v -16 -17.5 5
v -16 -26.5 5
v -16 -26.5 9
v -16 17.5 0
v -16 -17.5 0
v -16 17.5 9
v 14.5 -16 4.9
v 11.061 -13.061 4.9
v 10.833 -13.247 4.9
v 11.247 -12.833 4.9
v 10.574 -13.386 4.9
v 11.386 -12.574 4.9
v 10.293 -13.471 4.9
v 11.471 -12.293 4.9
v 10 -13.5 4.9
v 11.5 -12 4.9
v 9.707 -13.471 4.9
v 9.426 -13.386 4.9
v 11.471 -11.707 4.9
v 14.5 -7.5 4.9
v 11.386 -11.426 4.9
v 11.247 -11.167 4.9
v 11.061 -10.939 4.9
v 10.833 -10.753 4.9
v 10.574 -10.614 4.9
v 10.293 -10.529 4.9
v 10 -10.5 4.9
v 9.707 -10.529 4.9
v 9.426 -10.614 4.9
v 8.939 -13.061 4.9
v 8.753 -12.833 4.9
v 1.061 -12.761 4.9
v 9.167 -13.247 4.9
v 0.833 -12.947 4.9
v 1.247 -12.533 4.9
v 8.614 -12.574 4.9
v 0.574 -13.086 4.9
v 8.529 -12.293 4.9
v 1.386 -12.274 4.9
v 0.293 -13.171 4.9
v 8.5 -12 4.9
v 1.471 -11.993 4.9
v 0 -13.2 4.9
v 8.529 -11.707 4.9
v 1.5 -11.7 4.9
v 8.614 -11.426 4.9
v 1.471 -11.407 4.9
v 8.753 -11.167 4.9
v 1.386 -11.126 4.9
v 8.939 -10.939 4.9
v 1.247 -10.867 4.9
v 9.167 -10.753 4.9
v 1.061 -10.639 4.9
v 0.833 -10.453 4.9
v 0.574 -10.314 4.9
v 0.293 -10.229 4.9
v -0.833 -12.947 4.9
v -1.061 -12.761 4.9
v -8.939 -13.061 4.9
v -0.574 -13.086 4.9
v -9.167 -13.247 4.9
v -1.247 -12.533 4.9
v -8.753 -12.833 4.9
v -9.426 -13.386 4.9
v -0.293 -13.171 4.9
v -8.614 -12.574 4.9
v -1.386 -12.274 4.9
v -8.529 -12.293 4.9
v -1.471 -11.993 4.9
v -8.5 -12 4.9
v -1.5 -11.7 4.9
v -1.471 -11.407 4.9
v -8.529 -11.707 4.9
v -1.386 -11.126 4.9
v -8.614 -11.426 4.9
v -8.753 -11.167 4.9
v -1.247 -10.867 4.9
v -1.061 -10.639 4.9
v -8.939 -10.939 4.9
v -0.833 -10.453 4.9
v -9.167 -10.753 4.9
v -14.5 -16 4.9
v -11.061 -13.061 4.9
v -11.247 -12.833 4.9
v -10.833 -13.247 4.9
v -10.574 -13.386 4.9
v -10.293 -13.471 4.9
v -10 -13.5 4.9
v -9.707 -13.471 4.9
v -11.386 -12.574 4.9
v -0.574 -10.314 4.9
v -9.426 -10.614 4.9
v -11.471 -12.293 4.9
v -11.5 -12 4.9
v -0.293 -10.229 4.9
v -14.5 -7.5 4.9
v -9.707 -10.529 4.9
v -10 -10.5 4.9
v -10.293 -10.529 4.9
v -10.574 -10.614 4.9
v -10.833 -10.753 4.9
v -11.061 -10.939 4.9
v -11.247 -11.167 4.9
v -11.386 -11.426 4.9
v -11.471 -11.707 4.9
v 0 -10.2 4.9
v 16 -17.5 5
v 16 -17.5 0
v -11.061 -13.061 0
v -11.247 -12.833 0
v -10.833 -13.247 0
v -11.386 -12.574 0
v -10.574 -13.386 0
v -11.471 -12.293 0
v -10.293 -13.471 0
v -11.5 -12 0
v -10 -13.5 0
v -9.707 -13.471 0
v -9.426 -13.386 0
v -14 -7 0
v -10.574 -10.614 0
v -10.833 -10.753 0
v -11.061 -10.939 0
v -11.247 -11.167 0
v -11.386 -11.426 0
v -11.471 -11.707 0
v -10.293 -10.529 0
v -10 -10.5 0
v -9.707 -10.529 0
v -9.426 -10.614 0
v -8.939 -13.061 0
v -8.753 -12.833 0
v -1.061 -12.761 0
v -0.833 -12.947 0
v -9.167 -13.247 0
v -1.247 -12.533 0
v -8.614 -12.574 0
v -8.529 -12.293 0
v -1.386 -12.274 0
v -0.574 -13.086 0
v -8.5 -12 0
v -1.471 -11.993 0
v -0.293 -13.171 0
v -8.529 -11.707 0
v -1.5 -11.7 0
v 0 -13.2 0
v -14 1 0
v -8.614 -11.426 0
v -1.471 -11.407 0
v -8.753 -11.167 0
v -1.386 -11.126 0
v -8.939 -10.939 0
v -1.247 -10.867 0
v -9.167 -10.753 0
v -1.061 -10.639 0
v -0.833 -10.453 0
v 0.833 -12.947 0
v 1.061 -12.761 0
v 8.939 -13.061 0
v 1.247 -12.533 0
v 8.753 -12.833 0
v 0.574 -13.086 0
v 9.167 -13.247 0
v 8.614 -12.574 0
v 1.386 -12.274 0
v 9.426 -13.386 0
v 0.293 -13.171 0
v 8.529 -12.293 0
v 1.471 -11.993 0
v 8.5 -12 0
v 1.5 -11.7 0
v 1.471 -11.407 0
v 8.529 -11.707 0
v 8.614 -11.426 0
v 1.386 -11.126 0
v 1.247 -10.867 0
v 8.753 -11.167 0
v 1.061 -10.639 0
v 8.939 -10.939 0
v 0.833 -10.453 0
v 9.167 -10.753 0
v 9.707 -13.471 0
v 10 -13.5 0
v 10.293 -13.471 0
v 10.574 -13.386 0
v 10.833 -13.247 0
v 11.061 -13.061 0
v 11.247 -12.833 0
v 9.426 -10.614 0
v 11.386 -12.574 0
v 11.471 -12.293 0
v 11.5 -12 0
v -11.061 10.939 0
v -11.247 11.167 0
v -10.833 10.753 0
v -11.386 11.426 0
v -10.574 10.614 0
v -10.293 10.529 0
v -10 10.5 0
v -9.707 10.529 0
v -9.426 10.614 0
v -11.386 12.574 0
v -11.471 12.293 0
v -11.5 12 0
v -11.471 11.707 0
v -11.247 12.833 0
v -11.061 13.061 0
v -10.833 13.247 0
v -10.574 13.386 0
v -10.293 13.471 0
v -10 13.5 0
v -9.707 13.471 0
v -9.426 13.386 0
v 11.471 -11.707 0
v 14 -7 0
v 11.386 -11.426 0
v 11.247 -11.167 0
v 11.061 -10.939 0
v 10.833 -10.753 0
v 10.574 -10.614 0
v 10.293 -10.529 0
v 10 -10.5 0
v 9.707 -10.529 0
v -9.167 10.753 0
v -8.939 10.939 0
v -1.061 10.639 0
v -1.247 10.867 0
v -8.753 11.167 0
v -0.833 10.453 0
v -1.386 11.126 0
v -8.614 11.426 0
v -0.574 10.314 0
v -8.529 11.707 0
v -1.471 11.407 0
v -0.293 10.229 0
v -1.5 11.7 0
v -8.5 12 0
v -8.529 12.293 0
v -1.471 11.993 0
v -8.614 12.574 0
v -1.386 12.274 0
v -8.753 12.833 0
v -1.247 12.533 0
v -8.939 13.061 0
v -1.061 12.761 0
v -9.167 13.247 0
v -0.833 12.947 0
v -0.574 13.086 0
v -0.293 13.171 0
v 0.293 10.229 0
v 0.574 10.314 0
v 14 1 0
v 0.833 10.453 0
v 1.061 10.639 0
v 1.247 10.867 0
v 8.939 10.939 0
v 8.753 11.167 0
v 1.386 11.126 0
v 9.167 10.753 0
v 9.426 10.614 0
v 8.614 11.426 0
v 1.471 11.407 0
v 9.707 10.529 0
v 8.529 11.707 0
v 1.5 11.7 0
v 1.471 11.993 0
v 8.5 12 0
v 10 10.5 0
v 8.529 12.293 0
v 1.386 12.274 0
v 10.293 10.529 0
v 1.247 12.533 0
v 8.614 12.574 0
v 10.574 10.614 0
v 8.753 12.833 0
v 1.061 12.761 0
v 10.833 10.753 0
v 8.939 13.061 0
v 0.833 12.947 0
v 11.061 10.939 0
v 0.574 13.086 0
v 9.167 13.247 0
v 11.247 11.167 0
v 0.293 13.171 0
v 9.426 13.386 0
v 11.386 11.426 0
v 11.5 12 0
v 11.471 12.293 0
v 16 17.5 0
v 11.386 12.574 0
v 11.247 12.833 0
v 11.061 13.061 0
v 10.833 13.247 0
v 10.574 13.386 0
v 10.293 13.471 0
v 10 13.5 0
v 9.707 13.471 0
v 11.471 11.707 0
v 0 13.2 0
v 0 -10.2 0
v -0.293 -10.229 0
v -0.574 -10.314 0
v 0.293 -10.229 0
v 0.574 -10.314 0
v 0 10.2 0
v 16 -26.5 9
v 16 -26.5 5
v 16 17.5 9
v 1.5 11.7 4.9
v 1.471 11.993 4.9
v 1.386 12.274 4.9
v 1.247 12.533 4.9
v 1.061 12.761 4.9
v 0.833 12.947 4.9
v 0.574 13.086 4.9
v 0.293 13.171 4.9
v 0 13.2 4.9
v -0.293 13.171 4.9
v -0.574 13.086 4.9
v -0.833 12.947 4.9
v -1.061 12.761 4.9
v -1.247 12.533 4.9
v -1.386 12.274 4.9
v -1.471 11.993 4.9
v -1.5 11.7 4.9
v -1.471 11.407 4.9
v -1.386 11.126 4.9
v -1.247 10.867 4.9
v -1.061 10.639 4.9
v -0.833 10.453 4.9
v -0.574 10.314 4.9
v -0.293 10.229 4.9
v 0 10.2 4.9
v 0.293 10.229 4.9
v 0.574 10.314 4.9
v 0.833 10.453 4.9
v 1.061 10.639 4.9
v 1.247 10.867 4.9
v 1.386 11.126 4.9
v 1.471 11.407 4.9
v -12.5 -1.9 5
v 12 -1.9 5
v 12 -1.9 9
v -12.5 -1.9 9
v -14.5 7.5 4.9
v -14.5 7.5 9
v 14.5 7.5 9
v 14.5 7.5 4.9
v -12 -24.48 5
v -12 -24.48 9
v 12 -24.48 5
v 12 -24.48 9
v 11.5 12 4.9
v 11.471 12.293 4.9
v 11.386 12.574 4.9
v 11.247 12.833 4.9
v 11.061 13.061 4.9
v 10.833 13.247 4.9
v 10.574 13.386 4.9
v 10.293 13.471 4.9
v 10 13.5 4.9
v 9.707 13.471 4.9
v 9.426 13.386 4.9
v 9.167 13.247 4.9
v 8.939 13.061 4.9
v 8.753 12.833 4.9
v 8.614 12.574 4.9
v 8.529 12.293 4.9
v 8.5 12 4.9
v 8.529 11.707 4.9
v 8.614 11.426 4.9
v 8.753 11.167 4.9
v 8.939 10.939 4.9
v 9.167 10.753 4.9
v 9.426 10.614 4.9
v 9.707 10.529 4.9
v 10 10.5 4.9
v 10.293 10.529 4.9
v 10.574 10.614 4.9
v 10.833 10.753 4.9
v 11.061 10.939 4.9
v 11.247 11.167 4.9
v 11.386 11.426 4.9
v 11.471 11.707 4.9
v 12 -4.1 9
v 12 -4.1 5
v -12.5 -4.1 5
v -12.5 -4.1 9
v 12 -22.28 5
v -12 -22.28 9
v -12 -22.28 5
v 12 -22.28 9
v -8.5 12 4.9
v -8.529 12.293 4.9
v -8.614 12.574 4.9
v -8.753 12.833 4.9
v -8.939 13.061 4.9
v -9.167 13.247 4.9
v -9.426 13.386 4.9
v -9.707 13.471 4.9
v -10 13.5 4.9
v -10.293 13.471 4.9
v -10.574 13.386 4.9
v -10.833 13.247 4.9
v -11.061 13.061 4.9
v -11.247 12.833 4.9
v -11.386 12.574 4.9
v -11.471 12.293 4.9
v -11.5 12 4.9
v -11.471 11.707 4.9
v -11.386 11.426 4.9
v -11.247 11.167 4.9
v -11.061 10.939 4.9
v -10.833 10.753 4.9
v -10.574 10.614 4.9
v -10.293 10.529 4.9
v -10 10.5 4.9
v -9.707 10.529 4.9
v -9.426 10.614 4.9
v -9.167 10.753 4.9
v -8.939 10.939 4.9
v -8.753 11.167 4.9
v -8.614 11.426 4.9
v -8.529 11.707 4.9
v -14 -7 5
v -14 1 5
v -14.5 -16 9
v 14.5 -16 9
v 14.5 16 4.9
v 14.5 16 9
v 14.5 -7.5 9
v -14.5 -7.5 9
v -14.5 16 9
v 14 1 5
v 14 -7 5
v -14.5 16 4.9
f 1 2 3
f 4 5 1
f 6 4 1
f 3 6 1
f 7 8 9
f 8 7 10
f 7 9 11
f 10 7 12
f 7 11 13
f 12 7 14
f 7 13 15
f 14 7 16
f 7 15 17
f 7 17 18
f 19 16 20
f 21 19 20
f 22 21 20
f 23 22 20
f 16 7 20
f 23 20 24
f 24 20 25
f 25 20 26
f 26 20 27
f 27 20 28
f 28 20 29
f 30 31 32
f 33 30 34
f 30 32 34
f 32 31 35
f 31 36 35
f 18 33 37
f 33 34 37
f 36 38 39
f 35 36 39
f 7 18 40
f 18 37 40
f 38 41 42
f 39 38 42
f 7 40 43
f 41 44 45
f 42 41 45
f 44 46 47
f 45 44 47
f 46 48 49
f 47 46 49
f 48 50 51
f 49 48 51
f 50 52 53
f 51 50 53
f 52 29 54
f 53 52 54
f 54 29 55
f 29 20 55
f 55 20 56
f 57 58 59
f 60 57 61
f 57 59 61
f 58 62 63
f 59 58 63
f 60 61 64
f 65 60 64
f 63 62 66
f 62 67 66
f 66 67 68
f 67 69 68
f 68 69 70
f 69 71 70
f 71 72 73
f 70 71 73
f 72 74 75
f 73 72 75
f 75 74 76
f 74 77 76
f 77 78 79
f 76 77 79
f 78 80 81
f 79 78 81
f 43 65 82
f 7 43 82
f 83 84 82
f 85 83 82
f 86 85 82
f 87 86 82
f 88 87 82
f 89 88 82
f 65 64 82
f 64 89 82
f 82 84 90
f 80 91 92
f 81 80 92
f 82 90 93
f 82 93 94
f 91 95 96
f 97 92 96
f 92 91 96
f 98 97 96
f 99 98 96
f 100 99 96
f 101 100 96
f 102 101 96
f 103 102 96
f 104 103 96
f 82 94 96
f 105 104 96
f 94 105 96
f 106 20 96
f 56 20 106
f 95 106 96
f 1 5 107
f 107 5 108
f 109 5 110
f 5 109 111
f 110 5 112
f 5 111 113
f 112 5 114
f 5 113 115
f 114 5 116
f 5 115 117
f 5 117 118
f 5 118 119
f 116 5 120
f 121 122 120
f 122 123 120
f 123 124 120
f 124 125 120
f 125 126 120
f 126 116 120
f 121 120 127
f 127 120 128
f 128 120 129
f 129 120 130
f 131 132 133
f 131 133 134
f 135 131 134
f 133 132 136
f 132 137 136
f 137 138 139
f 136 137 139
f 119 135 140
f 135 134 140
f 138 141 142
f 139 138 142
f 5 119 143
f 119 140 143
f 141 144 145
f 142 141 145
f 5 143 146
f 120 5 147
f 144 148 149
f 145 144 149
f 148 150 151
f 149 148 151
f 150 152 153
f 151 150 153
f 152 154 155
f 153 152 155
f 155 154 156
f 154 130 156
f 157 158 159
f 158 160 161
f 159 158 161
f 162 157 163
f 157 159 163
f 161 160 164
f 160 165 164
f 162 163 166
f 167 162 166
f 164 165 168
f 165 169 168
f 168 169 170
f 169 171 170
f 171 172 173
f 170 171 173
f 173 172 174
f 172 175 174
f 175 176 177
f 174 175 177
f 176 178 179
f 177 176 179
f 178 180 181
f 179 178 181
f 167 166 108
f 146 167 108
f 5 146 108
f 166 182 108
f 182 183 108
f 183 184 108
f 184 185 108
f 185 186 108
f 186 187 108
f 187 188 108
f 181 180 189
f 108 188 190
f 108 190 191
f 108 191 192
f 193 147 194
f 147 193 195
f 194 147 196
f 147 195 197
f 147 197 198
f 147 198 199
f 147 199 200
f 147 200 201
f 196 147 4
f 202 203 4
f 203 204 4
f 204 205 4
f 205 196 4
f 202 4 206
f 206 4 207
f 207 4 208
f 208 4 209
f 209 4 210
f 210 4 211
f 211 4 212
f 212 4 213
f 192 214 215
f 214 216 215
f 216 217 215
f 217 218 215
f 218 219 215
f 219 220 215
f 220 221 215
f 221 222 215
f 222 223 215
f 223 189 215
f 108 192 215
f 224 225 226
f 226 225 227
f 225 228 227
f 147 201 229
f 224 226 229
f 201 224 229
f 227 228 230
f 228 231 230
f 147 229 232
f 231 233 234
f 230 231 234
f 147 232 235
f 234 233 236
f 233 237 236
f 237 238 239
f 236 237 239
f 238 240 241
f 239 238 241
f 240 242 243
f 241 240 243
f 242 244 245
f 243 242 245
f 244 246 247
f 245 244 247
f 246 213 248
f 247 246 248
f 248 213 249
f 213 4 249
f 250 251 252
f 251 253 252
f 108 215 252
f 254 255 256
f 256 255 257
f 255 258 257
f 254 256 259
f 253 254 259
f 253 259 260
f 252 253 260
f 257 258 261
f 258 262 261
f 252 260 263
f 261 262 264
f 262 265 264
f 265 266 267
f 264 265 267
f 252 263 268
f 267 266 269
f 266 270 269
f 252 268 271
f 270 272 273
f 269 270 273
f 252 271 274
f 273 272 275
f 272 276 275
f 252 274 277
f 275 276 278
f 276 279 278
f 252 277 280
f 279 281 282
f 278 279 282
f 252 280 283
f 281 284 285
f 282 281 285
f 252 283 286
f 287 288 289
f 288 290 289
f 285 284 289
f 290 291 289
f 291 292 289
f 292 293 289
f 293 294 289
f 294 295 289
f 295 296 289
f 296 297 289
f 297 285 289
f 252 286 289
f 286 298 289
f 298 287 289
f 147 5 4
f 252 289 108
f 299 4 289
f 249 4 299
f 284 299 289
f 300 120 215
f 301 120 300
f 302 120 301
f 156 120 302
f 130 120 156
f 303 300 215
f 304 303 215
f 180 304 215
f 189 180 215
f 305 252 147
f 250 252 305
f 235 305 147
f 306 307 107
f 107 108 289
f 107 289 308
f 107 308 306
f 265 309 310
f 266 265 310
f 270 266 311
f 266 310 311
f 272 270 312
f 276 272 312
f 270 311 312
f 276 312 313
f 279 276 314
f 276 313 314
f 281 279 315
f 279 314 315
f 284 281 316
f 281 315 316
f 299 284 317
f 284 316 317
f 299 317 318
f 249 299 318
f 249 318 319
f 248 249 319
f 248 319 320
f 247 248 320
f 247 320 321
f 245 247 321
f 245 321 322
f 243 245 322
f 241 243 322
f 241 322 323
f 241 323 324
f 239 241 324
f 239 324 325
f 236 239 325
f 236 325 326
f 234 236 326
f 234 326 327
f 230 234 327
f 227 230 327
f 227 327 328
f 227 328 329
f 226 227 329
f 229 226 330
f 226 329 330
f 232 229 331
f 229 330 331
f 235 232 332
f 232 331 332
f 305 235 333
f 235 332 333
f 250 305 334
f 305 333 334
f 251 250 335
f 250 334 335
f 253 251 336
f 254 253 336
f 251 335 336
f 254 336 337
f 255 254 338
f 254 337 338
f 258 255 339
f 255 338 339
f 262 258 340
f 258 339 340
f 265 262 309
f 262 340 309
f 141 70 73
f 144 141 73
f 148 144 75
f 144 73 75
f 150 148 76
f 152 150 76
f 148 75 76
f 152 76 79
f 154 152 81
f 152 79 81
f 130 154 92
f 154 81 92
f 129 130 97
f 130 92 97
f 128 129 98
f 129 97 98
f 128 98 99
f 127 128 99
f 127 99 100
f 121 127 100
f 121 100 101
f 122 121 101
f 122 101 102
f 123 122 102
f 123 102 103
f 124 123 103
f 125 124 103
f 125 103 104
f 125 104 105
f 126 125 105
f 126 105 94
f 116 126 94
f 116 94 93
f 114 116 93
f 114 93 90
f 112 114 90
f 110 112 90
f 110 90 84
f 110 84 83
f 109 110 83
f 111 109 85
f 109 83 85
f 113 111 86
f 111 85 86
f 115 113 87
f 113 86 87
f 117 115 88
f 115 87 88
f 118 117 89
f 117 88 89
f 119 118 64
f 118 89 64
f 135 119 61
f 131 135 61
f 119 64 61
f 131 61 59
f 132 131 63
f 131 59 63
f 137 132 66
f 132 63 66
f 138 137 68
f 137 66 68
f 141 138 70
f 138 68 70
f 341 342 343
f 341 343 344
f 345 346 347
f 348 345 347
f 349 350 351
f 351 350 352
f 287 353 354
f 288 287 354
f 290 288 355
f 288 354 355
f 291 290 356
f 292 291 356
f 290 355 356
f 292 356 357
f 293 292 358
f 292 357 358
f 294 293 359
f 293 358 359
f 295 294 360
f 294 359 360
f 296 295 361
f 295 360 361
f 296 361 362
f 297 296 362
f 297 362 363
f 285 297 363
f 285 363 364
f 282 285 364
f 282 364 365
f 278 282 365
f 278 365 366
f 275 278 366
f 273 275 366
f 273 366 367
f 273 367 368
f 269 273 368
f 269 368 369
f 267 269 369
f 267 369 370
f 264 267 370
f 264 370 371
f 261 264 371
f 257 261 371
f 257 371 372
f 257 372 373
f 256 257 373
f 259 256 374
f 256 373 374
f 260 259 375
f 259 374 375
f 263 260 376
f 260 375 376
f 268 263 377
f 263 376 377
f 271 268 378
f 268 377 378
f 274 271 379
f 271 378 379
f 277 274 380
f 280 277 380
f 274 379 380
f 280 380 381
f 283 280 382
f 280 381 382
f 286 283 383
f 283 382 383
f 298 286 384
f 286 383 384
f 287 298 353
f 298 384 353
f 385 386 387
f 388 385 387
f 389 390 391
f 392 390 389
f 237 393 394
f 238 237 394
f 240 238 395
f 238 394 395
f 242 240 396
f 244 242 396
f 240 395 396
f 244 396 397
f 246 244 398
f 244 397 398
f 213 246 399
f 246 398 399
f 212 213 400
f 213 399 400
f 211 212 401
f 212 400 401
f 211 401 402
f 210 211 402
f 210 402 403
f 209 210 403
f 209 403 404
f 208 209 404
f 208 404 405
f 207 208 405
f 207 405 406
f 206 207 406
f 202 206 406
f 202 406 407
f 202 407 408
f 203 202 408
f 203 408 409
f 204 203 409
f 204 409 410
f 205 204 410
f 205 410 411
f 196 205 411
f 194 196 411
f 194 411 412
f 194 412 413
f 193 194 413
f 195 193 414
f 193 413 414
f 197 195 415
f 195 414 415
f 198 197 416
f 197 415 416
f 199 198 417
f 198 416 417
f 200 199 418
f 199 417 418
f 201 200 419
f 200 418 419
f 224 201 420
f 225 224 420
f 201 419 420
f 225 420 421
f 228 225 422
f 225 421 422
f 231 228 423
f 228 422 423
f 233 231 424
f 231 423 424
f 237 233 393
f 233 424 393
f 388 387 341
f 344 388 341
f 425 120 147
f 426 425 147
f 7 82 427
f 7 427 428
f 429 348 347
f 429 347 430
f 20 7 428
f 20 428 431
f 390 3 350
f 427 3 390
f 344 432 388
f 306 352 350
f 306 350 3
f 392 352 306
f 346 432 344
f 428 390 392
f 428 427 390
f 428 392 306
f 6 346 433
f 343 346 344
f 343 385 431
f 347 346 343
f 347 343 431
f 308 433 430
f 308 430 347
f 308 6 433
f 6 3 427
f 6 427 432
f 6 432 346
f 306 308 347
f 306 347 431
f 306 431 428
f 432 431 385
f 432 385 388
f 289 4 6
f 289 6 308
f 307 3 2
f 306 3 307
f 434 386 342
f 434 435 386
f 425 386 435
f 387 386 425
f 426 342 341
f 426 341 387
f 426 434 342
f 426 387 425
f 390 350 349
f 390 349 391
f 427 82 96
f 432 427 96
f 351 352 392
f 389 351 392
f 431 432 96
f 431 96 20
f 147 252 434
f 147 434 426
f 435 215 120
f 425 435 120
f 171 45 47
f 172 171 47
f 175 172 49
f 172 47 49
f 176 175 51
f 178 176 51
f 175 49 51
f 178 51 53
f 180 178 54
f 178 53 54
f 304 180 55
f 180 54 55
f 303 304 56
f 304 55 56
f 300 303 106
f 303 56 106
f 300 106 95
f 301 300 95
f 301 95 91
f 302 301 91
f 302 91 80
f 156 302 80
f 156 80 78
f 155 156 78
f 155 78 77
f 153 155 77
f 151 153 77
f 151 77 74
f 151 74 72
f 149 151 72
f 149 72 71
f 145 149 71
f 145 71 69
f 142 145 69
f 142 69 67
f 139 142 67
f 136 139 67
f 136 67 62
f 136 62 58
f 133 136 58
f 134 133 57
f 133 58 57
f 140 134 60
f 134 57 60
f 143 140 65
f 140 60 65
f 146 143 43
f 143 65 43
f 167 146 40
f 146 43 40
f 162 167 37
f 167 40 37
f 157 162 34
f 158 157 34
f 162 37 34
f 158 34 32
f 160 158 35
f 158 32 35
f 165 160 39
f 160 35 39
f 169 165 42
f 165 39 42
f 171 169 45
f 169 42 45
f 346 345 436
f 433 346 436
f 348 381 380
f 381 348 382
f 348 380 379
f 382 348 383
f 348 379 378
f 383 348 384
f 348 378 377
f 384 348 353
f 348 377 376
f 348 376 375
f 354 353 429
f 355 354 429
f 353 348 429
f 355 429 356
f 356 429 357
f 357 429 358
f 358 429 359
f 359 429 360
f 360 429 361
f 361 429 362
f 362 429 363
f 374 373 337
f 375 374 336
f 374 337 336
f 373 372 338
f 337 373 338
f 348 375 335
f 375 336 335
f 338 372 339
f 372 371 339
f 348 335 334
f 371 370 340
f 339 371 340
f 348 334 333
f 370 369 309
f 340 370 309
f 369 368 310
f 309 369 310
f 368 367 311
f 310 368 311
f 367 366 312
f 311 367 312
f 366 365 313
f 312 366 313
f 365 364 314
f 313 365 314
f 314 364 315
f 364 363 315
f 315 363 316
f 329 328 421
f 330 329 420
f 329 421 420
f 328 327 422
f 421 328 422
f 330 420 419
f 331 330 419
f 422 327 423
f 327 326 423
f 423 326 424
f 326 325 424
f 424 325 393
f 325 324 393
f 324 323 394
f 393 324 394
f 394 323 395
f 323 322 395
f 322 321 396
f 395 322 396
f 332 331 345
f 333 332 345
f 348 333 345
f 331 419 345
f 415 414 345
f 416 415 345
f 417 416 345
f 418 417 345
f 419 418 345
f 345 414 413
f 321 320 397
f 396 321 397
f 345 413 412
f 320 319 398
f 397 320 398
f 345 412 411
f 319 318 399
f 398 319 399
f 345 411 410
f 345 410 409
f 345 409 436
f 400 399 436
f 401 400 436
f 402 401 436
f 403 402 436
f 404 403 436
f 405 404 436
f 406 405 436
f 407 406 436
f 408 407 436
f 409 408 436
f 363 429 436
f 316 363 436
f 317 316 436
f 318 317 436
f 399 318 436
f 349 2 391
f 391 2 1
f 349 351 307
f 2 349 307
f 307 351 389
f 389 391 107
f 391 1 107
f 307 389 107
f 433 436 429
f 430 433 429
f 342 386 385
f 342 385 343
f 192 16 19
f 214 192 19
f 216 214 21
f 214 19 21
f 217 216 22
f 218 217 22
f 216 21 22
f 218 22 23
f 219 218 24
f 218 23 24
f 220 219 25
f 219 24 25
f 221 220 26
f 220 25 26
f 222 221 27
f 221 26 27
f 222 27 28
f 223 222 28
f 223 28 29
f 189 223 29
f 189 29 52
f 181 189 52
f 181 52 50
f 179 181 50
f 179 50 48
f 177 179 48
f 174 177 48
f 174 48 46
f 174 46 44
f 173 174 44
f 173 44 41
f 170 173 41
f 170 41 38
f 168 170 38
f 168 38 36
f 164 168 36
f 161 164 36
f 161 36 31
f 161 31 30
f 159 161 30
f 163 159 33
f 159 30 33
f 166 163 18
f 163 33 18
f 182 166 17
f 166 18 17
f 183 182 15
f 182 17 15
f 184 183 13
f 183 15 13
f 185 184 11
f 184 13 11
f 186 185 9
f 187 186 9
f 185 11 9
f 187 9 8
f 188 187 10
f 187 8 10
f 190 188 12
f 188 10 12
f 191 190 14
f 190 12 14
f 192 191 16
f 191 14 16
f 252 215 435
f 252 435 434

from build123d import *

# Parameters (mm, degrees)
SKETCH4_W                 = 32
SKETCH4_H                 = 35
BOSS_EXTRUDE1_DEPTH       = 9
SHELL1_T                  = -1.5
SHELL1_THICKNESS_2_FACE_W = 29
SHELL1_THICKNESS_2_FACE_H = 32
SHELL1_THICKNESS_2_DEPTH  = 3.4
SKETCH5_R                 = 1.5
CUT_EXTRUDE2_DEPTH        = 9
RIB6_REACH                = 27.362
SKETCH12_WALLS_W          = 81.724747412
SKETCH12_WALLS_H          = 15
SKETCH13_W                = 28
SKETCH13_H                = 8
CUT_EXTRUDE3_DEPTH        = 5
SKETCH15_W                = 24.5
SKETCH15_H                = 2.2
CUT_EXTRUDE4_DEPTH        = 10
SKETCH16_W                = 32
SKETCH16_H                = 4
BOSS_EXTRUDE2_DEPTH       = 9
SKETCH17_W                = 24
SKETCH17_H                = 2.2
CUT_EXTRUDE5_DEPTH        = 10


with BuildPart() as part:
    # Sketch4 → Boss-Extrude1 (new body)
    with BuildSketch(Plane.XY):
        Rectangle(SKETCH4_W, SKETCH4_H)
    extrude(amount=BOSS_EXTRUDE1_DEPTH)

    # Shell1
    shell1_openings = [part.faces().sort_by_distance(p)[0] for p in [
        (0, 0, 9),
    ]]
    offset(amount=SHELL1_T, openings=shell1_openings, kind=Kind.INTERSECTION)

    # Shell1 thickness 2 face (on inner face of the shell) → Shell1 thickness 2 (add)
    with BuildSketch(Plane(origin=(0, 0, 1.5), x_dir=(-1, 0, 0), z_dir=(0, 0, -1))):
        Rectangle(SHELL1_THICKNESS_2_FACE_W, SHELL1_THICKNESS_2_FACE_H)
    extrude(amount=-SHELL1_THICKNESS_2_DEPTH)

    # Sketch5 → Cut-Extrude2 (cut)
    with BuildSketch(Plane.XY.offset(4.9)):
        with Locations((-10, -12)):
            Circle(SKETCH5_R)
        with Locations((10, -12)):
            Circle(SKETCH5_R)
        with Locations((0, 11.7)):
            Circle(SKETCH5_R)
        with Locations((0, -11.7)):
            Circle(SKETCH5_R)
        with Locations((-10, 12)):
            Circle(SKETCH5_R)
        with Locations((10, 12)):
            Circle(SKETCH5_R)
    extrude(amount=-CUT_EXTRUDE2_DEPTH, mode=Mode.SUBTRACT)

    # Sketch12 walls → Rib6 (add, up to next)
    with BuildSketch(Plane.XY.offset(9), mode=Mode.PRIVATE) as rib6_sk1:
        Rectangle(SKETCH12_WALLS_W, SKETCH12_WALLS_H)
    rib6_tool1 = extrude(rib6_sk1.sketch, amount=-RIB6_REACH, mode=Mode.PRIVATE) - part.part
    add(rib6_tool1.solids().sort_by_distance((0, 0, 9))[0])

    # Sketch13 → Cut-Extrude3 (cut)
    with BuildSketch(Plane(origin=(0, 0, 0), x_dir=(-1, 0, 0), z_dir=(0, 0, -1))):
        with Locations((0, -3)):
            Rectangle(SKETCH13_W, SKETCH13_H)
    extrude(amount=-CUT_EXTRUDE3_DEPTH, mode=Mode.SUBTRACT)

    # Sketch15 → Cut-Extrude4 (cut)
    with BuildSketch(Plane(origin=(0, 0, 5), x_dir=(-1, 0, 0), z_dir=(0, 0, -1))):
        with Locations((0.25, -3)):
            Rectangle(SKETCH15_W, SKETCH15_H)
    extrude(amount=-CUT_EXTRUDE4_DEPTH, mode=Mode.SUBTRACT)

    # Sketch16 → Boss-Extrude2 (add)
    with BuildSketch(Plane.XZ.offset(17.5)):
        with Locations((0, 7)):
            Rectangle(SKETCH16_W, SKETCH16_H)
    extrude(amount=BOSS_EXTRUDE2_DEPTH)

    # Sketch17 → Cut-Extrude5 (cut)
    with BuildSketch(Plane.XY.offset(9)):
        with Locations((0, -23.38)):
            Rectangle(SKETCH17_W, SKETCH17_H)
    extrude(amount=-CUT_EXTRUDE5_DEPTH, mode=Mode.SUBTRACT)


solid = part.part
